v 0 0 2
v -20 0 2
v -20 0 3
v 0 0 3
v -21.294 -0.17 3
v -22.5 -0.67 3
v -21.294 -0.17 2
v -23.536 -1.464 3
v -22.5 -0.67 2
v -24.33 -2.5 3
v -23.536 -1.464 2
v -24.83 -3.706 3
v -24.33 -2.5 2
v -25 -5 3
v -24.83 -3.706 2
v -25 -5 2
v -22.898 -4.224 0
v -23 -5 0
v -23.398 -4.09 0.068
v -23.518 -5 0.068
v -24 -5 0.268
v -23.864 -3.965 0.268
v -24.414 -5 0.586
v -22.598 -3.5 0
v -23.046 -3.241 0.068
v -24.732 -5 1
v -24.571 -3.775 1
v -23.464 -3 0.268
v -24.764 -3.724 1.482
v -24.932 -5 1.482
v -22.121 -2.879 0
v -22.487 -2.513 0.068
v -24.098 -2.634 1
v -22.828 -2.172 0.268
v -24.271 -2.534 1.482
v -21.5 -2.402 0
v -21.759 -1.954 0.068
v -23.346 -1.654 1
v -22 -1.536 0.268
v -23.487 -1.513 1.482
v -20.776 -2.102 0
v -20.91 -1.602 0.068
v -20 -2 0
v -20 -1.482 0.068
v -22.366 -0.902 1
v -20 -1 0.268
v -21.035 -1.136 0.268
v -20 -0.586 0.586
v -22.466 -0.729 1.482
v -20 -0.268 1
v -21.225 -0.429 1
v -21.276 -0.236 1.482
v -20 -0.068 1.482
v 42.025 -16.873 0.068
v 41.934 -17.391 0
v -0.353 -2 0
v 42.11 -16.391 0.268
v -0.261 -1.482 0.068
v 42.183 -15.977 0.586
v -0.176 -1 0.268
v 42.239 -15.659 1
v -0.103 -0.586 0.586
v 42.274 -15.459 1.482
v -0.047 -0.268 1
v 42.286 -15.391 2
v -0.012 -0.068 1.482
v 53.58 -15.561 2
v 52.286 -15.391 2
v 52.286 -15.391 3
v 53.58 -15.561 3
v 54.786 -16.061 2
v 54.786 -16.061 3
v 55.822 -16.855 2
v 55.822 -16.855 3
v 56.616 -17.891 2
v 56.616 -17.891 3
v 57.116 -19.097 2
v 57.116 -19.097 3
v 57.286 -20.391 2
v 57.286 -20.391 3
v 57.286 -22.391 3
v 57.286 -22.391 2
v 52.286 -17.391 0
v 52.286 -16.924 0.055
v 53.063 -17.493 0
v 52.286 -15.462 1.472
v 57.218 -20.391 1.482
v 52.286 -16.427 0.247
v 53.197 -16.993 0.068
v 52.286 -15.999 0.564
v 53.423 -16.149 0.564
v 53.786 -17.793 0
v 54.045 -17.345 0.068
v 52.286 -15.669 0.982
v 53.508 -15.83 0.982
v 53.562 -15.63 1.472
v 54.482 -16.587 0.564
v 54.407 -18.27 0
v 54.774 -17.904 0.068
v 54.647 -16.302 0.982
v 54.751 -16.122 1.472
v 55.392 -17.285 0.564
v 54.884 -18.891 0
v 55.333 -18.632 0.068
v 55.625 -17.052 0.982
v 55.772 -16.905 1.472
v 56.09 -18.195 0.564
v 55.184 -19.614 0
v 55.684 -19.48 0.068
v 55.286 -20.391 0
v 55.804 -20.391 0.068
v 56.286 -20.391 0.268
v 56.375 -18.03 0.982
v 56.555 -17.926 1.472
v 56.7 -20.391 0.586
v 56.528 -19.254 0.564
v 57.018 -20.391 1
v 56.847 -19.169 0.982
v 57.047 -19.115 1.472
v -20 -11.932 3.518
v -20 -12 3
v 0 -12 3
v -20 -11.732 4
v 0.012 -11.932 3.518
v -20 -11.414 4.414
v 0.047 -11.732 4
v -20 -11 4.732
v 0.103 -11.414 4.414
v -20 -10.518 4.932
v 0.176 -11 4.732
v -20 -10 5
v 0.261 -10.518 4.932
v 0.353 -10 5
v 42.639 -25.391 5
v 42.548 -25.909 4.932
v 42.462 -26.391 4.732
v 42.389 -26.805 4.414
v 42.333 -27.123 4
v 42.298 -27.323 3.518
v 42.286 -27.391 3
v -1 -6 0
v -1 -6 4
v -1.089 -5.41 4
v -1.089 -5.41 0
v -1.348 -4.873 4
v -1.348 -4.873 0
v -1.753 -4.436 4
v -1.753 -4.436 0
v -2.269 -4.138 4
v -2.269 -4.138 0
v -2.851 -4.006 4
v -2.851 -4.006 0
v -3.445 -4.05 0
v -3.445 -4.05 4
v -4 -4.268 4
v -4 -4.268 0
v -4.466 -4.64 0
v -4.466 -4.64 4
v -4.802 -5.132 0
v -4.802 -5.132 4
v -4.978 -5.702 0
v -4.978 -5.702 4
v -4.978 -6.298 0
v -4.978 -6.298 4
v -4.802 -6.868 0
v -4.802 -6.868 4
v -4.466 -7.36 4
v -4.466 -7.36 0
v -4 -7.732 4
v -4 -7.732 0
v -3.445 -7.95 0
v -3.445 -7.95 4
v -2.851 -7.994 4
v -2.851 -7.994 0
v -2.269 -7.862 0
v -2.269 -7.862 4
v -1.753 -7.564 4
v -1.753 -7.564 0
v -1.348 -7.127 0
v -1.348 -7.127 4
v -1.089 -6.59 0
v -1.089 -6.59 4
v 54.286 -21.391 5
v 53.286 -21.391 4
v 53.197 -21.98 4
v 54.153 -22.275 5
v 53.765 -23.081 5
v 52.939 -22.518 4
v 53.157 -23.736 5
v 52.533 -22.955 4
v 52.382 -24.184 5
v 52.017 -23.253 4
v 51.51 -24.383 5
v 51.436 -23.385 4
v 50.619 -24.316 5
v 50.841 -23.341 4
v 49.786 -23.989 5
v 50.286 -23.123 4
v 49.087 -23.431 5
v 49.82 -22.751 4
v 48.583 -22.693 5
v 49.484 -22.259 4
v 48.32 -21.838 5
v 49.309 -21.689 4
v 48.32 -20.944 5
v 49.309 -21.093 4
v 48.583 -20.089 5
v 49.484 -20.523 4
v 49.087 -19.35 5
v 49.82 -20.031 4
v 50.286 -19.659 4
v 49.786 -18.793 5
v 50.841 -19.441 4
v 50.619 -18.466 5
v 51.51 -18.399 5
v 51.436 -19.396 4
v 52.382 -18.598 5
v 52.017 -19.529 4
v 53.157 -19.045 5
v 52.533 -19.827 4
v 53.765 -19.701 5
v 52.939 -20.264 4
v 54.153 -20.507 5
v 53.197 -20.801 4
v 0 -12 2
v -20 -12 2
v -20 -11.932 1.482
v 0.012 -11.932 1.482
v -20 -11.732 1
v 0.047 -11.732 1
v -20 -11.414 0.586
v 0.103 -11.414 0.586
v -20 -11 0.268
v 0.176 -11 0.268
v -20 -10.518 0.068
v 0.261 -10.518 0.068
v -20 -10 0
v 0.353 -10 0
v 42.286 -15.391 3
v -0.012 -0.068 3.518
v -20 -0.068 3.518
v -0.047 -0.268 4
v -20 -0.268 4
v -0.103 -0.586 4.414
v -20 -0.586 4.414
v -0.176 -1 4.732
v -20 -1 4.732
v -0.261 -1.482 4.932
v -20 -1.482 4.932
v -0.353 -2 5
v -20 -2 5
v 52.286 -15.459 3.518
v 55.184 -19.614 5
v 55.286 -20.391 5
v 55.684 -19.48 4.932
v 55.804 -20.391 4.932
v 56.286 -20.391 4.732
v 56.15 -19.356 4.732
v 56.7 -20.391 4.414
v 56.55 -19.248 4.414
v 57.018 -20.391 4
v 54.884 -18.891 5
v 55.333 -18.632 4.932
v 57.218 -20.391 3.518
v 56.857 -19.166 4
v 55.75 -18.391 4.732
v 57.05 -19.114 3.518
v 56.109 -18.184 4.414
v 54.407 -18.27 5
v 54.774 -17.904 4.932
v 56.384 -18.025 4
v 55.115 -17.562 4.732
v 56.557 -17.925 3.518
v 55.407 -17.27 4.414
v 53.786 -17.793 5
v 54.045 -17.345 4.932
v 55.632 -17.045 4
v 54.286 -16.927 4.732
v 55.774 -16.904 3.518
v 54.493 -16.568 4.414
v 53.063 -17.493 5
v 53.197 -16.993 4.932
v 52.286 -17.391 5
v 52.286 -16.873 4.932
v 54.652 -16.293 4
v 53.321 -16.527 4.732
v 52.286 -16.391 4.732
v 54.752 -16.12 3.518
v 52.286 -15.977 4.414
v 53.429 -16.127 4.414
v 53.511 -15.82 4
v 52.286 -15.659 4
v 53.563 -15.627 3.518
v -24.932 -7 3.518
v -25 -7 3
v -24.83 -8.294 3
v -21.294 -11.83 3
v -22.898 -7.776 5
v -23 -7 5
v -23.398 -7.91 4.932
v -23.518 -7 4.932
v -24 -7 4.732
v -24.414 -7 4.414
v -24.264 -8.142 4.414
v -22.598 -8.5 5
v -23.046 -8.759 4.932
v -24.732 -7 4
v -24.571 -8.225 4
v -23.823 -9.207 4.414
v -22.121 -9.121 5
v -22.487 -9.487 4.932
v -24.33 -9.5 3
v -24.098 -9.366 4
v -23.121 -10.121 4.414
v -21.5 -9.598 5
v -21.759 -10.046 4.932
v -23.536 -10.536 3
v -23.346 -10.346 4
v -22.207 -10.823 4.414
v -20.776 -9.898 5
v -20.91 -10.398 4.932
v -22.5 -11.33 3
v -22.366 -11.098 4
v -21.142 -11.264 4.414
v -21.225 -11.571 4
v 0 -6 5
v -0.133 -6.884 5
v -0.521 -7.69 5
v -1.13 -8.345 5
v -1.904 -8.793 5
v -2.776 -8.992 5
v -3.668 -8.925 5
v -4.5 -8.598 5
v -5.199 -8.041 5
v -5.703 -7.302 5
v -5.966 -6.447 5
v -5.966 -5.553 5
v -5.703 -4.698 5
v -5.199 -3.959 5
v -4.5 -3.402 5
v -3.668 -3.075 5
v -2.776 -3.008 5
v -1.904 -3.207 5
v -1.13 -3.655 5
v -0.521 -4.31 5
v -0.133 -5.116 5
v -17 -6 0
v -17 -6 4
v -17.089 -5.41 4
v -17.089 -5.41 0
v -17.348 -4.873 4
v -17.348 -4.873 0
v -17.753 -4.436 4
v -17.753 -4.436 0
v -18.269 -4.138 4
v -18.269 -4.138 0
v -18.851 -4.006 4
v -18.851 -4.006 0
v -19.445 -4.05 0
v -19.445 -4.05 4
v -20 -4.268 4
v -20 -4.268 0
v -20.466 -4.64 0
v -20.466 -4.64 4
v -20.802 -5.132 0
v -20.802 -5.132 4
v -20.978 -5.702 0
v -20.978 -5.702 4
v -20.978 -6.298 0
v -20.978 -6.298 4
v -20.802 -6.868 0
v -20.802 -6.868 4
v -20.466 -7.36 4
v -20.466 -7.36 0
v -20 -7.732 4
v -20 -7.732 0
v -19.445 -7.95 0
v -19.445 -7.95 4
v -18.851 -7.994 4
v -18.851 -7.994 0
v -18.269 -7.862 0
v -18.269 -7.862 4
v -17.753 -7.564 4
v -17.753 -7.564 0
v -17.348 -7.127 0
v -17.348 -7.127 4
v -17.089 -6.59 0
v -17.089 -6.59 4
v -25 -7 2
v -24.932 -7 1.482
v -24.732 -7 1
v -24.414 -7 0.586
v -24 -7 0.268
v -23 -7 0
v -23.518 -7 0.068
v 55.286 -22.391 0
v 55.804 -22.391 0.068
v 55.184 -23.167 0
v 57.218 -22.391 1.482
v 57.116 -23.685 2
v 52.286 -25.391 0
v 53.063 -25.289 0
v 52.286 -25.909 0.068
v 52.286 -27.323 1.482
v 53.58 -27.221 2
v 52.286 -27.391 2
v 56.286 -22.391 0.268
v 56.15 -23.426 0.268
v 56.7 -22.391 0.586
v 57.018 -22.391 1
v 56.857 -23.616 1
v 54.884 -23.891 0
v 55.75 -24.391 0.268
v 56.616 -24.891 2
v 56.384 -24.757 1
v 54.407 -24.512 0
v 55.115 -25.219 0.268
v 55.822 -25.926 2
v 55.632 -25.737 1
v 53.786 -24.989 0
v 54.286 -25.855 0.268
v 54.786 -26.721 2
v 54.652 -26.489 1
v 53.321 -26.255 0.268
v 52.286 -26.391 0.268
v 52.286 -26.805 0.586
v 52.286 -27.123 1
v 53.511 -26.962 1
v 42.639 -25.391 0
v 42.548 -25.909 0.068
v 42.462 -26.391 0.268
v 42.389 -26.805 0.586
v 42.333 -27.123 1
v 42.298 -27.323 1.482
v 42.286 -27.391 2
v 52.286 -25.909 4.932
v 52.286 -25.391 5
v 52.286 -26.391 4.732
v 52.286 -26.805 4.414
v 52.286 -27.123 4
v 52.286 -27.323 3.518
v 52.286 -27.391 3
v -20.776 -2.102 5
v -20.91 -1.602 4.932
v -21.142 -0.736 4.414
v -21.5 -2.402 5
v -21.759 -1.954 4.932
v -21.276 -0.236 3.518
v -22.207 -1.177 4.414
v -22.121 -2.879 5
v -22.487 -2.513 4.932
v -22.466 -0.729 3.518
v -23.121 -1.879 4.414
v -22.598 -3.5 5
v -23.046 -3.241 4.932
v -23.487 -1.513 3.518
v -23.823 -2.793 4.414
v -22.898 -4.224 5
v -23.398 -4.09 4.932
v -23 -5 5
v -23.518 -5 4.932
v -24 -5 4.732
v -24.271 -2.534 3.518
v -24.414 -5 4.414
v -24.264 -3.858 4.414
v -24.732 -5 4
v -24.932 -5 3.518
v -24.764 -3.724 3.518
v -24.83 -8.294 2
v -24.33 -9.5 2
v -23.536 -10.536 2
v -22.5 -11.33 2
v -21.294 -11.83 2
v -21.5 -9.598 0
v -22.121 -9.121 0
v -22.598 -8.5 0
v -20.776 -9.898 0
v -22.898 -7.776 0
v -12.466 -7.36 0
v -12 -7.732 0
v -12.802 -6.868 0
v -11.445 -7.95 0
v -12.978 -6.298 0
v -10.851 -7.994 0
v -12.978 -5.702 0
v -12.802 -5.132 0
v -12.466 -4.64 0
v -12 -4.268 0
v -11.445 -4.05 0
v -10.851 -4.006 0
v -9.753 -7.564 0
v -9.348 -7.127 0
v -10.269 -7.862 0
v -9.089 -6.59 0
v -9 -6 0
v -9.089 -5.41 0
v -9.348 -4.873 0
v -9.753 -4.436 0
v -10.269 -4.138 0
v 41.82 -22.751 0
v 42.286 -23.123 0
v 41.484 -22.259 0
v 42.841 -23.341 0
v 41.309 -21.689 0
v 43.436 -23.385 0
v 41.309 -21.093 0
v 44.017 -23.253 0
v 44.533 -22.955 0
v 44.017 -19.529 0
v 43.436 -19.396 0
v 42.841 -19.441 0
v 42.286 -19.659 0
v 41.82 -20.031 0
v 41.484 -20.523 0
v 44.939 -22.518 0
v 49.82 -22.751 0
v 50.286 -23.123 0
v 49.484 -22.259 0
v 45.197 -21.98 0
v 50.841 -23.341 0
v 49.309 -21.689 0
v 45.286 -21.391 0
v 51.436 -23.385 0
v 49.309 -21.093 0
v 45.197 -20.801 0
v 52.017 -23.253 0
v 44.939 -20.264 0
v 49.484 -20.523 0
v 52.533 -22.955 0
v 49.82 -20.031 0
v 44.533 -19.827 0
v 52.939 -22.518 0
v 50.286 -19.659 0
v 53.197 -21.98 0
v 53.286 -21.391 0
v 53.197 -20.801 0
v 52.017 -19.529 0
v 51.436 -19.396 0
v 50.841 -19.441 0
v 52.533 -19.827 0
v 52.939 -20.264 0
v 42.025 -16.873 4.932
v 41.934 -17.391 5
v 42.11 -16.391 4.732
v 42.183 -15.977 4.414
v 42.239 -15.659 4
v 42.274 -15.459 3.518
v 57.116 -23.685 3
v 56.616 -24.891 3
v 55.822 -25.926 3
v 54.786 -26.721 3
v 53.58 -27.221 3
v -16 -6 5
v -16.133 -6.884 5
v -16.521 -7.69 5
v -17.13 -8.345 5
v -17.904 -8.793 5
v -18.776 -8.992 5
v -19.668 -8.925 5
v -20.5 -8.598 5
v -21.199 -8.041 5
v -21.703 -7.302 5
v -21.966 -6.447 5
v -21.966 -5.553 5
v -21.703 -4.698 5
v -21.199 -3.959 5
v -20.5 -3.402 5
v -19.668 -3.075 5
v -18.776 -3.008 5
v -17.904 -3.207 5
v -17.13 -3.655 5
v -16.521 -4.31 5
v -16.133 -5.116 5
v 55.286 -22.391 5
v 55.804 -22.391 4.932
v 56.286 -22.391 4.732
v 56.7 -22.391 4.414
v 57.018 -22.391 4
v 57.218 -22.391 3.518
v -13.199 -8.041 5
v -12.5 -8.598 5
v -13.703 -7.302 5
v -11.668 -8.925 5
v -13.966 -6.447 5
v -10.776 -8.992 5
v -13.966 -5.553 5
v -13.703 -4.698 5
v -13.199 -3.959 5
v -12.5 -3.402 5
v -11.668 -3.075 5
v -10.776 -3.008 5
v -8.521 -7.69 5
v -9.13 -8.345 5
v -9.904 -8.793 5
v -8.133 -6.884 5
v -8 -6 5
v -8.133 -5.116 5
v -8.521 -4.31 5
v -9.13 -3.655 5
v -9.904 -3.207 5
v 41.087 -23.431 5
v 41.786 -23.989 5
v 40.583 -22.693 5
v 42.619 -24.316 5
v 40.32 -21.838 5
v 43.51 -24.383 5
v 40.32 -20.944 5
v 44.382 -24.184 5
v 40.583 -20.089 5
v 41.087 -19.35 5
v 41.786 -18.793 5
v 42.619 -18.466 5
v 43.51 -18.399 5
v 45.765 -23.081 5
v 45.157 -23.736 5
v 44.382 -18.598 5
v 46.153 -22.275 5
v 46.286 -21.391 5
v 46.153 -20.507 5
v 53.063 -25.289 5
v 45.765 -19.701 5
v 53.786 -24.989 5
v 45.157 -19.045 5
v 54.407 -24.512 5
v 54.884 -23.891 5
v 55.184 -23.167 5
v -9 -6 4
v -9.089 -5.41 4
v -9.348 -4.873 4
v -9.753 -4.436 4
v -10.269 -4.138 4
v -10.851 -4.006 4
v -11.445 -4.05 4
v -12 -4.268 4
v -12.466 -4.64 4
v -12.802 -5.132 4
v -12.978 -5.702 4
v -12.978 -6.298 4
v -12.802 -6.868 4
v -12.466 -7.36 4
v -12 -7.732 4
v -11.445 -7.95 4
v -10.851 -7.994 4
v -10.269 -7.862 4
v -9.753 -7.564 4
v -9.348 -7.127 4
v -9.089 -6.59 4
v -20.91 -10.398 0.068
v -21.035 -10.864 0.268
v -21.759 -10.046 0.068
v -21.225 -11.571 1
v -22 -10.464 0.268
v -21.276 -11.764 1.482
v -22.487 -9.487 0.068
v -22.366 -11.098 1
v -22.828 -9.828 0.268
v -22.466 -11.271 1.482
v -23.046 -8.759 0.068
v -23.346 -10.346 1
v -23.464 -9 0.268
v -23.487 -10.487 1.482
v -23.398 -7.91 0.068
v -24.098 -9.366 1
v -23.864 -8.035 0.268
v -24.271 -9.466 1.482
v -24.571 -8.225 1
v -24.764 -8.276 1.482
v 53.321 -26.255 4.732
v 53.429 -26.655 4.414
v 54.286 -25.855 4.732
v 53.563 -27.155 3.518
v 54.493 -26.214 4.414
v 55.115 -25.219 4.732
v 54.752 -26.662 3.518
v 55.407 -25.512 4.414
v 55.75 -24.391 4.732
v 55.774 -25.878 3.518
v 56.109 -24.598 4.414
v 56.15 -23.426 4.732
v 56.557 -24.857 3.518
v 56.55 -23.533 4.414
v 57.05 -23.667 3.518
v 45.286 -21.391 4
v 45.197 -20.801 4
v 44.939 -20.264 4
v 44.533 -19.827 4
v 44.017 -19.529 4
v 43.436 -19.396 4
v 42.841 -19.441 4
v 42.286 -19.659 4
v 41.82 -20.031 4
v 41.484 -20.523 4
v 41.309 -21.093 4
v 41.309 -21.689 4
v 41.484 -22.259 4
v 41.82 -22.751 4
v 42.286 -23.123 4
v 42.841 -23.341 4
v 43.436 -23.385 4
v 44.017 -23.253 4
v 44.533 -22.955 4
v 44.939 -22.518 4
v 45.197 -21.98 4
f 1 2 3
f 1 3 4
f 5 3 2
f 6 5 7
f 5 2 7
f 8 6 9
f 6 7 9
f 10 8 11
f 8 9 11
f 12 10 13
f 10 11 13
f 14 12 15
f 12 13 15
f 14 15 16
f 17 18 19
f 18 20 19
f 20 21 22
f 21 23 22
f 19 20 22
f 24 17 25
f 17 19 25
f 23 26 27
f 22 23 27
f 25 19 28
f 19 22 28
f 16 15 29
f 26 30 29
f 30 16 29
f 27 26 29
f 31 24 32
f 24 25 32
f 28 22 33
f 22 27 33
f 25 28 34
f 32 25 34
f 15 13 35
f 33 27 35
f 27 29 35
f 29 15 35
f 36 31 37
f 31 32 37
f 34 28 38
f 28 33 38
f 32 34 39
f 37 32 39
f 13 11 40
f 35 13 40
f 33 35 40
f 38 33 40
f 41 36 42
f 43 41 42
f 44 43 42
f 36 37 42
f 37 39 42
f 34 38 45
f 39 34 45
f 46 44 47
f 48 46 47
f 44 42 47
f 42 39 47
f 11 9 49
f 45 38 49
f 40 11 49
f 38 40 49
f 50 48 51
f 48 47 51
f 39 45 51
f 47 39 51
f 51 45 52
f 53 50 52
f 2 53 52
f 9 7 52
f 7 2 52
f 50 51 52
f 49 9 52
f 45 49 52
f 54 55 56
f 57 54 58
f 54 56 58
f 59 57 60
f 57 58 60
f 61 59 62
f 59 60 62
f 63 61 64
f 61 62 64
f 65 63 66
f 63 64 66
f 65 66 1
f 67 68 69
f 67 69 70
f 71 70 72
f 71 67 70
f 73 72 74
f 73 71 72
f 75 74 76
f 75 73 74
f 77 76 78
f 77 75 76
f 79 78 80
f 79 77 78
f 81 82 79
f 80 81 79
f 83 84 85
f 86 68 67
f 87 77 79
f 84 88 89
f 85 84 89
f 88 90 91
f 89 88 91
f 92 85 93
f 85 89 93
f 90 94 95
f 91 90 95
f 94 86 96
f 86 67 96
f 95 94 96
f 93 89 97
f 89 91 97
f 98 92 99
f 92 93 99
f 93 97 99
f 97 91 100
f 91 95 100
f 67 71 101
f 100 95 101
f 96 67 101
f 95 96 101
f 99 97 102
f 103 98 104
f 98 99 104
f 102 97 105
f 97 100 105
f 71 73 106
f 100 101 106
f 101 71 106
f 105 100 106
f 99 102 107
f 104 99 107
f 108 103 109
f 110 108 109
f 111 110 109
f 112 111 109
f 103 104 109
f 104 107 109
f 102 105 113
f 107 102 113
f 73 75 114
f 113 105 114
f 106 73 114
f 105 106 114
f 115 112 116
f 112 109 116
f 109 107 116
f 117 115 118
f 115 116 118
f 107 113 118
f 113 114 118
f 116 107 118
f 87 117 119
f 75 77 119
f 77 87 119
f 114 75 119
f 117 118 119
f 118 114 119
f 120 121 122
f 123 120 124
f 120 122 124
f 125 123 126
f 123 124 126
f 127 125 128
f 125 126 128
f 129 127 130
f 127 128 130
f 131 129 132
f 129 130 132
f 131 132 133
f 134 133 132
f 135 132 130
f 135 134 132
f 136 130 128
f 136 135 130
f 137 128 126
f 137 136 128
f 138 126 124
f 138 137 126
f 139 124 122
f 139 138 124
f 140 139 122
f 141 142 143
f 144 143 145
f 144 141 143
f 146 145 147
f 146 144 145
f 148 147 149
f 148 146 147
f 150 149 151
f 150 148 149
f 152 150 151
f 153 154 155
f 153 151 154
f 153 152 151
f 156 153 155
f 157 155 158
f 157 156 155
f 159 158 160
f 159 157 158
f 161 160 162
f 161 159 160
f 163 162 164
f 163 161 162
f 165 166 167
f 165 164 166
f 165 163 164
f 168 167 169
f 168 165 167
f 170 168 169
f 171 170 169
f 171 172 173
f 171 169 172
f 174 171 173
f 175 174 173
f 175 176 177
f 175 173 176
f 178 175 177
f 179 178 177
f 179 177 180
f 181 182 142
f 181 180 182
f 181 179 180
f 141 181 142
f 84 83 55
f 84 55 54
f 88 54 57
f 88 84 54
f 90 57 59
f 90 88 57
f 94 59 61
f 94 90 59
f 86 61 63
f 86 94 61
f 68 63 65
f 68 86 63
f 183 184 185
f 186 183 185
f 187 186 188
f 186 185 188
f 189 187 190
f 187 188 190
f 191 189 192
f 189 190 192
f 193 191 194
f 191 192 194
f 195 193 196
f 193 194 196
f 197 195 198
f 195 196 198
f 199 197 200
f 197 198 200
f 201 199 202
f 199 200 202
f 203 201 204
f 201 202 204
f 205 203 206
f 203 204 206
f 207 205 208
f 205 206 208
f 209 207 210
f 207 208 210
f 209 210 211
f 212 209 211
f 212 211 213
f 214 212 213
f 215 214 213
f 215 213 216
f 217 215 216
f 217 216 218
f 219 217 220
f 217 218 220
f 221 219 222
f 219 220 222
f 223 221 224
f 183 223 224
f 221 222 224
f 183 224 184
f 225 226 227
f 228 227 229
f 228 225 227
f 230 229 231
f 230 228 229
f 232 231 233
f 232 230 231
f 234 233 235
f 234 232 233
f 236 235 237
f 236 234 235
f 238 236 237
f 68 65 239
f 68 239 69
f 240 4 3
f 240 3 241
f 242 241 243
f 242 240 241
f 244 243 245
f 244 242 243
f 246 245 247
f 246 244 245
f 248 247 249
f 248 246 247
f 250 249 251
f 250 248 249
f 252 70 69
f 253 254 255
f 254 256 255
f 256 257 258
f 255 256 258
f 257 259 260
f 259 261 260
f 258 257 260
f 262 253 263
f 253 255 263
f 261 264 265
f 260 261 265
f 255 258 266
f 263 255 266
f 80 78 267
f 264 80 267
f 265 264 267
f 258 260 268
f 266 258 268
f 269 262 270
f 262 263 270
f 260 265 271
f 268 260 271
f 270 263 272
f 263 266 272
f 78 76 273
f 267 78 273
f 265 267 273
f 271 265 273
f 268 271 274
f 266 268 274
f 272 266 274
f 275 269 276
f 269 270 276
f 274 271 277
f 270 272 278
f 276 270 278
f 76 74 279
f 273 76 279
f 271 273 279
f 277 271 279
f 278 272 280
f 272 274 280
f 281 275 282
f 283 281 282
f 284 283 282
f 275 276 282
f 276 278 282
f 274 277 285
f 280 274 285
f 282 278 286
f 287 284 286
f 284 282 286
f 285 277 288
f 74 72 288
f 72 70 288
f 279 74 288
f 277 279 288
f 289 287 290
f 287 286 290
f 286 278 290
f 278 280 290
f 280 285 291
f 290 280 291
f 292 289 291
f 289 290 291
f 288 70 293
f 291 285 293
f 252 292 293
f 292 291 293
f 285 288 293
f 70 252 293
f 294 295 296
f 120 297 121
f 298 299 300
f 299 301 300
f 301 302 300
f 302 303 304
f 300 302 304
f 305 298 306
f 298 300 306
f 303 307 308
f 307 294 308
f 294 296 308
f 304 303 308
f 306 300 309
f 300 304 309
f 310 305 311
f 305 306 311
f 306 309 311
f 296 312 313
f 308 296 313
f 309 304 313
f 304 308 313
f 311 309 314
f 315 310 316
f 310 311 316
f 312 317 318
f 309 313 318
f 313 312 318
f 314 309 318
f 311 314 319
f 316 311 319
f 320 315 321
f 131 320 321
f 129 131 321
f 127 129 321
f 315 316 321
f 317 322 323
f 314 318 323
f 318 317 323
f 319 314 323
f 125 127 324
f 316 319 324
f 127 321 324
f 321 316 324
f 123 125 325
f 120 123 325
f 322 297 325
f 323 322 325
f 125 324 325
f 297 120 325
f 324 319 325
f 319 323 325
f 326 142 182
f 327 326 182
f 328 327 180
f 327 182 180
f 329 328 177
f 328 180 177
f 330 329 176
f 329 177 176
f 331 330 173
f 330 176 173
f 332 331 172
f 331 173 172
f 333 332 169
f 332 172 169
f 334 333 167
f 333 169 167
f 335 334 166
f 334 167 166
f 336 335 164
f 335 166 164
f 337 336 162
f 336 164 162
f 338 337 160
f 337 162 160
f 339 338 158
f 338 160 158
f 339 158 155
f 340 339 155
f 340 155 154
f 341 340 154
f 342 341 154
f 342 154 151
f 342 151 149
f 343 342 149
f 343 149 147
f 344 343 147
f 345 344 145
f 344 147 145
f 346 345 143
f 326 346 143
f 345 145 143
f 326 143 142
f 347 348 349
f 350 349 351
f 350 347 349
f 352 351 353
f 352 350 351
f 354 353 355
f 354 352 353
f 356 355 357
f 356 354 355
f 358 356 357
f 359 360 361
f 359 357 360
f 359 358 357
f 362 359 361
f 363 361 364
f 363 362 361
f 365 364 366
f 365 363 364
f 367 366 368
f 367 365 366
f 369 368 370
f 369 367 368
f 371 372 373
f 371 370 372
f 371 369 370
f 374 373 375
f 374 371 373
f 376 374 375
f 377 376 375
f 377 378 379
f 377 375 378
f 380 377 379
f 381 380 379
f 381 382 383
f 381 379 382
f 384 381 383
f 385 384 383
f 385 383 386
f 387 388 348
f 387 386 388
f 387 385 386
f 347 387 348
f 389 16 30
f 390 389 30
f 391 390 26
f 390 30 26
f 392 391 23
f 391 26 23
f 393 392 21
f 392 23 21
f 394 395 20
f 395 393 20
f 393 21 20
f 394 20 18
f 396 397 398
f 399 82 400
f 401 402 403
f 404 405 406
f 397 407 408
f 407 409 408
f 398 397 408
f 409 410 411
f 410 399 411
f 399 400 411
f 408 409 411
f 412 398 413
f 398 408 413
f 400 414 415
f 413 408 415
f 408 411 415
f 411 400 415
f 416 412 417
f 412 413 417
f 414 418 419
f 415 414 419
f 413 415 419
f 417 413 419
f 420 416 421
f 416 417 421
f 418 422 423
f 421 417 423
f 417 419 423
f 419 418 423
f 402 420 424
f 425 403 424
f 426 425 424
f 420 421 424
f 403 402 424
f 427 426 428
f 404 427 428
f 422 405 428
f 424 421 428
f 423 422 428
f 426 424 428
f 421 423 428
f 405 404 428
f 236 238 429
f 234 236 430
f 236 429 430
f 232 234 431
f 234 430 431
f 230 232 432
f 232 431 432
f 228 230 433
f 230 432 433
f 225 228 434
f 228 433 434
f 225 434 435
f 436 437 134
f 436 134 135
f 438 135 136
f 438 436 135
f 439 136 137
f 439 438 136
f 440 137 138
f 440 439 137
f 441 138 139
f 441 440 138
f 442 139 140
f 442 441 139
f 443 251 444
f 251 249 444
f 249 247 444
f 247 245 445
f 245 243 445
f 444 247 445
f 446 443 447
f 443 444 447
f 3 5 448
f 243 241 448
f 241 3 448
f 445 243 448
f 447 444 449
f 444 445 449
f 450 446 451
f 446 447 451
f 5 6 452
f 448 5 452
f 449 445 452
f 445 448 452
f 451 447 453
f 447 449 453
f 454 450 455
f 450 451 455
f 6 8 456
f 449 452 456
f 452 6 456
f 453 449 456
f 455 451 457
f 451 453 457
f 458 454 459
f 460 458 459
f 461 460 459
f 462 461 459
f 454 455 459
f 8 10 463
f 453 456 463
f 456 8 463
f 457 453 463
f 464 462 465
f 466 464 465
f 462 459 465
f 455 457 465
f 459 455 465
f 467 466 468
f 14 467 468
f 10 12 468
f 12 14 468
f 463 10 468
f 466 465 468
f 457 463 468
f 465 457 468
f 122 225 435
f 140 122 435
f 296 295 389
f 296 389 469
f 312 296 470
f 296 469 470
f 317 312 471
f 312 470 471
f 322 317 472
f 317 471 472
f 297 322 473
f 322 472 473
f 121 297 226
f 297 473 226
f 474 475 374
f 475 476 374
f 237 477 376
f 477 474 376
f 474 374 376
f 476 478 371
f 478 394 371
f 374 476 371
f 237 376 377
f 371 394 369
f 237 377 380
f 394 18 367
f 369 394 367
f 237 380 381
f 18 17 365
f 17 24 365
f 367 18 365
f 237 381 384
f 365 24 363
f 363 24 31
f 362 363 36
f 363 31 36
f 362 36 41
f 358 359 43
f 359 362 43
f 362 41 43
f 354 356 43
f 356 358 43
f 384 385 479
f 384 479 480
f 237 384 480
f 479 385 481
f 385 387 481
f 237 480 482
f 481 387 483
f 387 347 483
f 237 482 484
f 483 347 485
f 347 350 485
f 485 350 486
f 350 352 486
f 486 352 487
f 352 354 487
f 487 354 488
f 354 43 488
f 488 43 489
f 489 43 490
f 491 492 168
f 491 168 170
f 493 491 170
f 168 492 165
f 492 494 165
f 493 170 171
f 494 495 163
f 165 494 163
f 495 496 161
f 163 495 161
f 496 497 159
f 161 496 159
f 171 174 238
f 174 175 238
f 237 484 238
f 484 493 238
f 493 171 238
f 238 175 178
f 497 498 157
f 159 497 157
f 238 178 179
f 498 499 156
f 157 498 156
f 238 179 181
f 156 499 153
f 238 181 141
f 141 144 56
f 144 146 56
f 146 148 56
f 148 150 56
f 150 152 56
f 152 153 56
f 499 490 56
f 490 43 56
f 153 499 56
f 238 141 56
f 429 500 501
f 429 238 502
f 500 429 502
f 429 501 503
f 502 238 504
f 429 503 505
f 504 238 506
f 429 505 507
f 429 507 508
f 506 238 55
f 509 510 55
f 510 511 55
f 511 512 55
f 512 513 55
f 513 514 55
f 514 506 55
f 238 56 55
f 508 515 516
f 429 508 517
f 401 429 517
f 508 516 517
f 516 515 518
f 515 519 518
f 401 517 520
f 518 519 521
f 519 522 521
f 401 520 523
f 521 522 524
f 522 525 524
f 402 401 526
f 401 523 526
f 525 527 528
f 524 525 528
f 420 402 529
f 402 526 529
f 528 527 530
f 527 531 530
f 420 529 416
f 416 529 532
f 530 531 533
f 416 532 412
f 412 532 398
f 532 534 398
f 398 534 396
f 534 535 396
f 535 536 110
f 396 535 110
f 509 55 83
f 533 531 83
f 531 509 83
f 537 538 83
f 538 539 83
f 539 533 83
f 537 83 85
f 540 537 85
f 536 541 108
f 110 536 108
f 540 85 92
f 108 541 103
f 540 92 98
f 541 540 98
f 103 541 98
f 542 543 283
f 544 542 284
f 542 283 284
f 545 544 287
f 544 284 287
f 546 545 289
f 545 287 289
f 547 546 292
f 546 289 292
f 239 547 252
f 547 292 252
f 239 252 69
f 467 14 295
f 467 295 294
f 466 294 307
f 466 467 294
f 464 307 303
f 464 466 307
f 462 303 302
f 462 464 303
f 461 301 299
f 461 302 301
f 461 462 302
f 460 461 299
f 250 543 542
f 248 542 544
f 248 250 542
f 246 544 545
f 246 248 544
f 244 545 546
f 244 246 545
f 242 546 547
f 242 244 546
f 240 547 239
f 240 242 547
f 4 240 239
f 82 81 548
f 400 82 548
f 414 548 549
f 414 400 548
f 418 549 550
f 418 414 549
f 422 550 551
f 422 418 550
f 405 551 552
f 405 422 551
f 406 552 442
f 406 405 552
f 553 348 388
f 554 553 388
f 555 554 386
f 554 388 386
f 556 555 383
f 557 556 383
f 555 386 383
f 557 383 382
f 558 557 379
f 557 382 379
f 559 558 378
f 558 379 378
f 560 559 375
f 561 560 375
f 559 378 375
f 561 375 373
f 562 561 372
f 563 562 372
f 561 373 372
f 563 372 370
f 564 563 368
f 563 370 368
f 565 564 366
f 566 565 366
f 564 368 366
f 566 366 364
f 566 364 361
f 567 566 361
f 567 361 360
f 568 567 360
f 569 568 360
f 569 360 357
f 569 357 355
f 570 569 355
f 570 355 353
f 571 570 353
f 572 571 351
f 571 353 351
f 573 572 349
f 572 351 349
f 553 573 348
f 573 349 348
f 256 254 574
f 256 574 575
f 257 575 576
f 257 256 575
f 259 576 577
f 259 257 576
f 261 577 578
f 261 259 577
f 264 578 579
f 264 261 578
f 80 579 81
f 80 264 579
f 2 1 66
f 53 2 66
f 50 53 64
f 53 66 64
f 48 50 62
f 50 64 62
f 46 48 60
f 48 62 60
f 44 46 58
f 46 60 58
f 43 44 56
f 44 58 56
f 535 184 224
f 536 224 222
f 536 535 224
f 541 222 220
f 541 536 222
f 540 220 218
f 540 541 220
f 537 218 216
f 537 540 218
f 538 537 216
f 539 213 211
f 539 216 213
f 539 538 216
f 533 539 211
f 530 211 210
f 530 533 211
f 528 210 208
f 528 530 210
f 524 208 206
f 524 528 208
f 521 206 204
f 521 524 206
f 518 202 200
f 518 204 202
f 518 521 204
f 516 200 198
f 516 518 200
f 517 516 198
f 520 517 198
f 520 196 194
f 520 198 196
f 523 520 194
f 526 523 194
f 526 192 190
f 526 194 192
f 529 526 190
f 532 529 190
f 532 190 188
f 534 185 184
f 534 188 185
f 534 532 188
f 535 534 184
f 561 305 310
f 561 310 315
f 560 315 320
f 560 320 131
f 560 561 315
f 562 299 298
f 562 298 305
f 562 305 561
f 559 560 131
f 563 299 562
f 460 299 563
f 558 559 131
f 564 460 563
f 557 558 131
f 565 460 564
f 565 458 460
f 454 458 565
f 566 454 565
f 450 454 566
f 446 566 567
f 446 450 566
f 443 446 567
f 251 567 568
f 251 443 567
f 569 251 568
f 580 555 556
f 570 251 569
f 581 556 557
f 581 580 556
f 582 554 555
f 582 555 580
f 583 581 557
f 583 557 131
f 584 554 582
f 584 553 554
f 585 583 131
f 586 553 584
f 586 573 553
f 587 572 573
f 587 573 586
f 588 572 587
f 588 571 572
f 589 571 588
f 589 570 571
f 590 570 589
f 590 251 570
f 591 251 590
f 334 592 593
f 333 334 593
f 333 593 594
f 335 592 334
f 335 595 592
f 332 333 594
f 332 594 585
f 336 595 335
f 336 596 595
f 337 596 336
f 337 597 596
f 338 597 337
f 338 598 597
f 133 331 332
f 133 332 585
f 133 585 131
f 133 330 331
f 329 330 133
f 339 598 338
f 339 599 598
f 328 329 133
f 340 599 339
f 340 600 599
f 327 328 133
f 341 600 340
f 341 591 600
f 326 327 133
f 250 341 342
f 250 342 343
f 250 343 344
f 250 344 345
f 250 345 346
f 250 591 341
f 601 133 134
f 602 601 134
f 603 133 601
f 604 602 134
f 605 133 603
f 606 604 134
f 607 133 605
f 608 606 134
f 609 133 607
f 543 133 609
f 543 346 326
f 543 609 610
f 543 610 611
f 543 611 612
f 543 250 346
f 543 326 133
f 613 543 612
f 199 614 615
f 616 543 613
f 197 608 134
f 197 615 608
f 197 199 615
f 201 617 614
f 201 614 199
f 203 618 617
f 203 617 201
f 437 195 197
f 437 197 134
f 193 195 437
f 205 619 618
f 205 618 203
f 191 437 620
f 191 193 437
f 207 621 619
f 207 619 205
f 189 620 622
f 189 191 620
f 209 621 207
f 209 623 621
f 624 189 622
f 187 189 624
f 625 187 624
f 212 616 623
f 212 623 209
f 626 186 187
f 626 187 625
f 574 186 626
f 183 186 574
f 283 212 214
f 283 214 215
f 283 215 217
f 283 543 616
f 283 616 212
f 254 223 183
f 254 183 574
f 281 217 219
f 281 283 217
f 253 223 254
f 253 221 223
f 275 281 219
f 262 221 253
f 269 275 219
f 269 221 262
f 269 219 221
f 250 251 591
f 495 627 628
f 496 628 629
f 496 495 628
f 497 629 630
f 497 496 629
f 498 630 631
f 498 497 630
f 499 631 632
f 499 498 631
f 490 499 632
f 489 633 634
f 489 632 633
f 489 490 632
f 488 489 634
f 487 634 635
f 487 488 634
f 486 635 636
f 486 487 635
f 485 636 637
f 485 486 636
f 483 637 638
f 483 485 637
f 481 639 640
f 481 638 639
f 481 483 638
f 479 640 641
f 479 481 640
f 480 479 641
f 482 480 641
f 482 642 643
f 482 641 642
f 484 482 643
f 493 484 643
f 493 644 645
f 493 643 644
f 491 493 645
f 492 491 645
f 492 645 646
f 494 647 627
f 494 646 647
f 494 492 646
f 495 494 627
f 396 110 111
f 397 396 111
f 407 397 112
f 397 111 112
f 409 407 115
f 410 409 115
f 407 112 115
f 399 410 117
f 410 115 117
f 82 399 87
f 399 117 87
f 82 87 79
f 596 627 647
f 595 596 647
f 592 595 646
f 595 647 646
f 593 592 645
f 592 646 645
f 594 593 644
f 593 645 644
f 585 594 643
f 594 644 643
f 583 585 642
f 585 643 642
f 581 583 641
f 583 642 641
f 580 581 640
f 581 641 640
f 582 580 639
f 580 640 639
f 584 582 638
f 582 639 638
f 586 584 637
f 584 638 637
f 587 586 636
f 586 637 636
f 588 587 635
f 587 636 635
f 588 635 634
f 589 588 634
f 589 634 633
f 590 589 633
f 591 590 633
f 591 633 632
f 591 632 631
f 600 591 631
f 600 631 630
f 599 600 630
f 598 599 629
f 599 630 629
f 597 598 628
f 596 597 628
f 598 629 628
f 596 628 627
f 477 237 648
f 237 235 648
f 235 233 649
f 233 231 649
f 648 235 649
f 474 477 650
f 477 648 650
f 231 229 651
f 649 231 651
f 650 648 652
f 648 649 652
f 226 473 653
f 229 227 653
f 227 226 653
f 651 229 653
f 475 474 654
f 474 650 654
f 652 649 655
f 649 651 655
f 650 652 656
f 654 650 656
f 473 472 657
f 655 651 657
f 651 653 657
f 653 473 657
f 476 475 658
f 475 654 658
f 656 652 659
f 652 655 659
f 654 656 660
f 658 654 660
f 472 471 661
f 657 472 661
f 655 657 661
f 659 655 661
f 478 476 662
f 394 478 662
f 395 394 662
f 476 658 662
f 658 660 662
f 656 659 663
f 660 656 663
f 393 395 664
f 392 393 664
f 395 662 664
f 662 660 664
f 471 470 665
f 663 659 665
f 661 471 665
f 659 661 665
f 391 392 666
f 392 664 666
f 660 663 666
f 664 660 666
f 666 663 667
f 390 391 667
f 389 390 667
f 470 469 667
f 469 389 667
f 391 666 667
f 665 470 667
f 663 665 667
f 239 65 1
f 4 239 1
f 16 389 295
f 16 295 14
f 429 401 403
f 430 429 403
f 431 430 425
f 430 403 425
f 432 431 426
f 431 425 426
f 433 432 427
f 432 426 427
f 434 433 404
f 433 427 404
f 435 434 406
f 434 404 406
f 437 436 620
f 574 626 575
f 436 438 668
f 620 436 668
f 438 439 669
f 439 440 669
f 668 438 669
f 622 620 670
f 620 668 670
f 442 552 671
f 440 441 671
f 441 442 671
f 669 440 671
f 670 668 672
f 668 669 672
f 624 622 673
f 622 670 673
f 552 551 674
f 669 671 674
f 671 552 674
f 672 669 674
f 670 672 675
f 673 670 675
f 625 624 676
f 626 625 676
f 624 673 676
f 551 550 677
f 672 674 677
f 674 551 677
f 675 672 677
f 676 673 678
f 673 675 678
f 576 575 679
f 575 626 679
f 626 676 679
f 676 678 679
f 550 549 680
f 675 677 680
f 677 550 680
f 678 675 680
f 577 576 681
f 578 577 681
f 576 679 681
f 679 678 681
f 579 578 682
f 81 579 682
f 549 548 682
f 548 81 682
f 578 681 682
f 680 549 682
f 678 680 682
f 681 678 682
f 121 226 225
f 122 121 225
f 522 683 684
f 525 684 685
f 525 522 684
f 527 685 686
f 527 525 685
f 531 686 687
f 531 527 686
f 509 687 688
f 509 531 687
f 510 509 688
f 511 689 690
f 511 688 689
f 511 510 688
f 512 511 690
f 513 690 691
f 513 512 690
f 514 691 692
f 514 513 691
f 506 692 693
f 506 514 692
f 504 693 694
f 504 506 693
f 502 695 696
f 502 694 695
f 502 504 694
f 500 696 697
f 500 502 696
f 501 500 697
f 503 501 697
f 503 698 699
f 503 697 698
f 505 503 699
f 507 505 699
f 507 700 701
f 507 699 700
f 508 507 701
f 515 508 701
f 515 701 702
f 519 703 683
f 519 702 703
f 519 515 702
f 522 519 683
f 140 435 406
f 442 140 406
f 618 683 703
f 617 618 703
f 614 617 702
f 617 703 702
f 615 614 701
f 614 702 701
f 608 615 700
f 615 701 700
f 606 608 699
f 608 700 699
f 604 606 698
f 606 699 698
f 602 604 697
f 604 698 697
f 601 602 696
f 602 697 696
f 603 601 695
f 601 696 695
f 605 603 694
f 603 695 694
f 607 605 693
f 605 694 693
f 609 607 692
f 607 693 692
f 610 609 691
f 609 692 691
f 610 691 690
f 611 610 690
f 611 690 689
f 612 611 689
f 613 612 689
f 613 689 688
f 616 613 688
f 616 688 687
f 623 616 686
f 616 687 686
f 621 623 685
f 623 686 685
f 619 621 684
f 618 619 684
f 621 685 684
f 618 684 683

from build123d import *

# Parameters (mm, degrees)
F0_W         = 25
F0_H         = 12
F0_W_2       = 15
F1_DEPTH     = 5
F2_R         = 2
F3_DEPTH     = 5.001
F4_R         = 2
F5_T1_DEPTH  = 5
F5_T4_ANGLE  = 90
F5_T6_ANGLE  = 90
F5_T8_ANGLE  = 90
F5_T10_ANGLE = 90
F5_T12_ANGLE = 90
F5_T14_ANGLE = 90
F5_T16_ANGLE = 90
F5_T18_ANGLE = 90
F6_SIZE      = 1


# Not quite as in the source:
# - a fillet or chamfer that OpenCascade refuses, or shapes differently, is made with other operations: its cross-section is extruded or revolved along the edge and cut away or added


with BuildPart() as f1:
    # F0 (on Top) → F1 (new body)
    with BuildSketch(Plane.XY):
        with Locations((-12.5, -6)):
            Rectangle(F0_W, F0_H)
        Polygon((42.2861679354, -15.3909064497), (0, 0), (0, -12), (42.2861679354, -27.3909064497), align=None)
        with Locations((49.7861679354, -21.3909064497)):
            Rectangle(F0_W_2, F0_H)
    extrude(amount=F1_DEPTH)

    # F2 (on Top) → F3 (cut, through all)
    with BuildSketch(Plane.XY):
        with Locations((51.2861679354, -21.3909064497)):
            Circle(F2_R)
        with Locations((-19, -6)):
            Circle(F2_R)
        with Locations((43.2861679354, -21.3909064497)):
            Circle(F2_R)
        with Locations((-11, -6)):
            Circle(F2_R)
        with Locations((-3, -6)):
            Circle(F2_R)
    extrude(amount=F3_DEPTH, mode=Mode.SUBTRACT)

    # F4
    f4_edges = [f1.edges().sort_by_distance(p)[0] for p in [
        (21.143084, -19.695453, 5),
        (21.143084, -7.695453, 5),
        (-12.5, -12, 5),
        (-12.5, 0, 5),
        (49.786168, -27.390906, 5),
        (57.286168, -21.390906, 5),
        (49.786168, -15.390906, 5),
        (49.786168, -27.390906, 0),
        (21.143084, -19.695453, 0),
        (-12.5, -12, 0),
        (57.286168, -21.390906, 0),
        (21.143084, -7.695453, 0),
        (49.786168, -15.390906, 0),
        (-12.5, 0, 0),
        (-25, -6, 0),
        (-25, -6, 5),
    ]]
    fillet(f4_edges, radius=F4_R)

    # F5: fillet of radius 5 on 4 edges, made by hand

    # F5_s2 → F5_t1 (cut)
    with BuildSketch(Plane.XY):
        with BuildLine():
            ThreePointArc((52.2861679354, -15.3909064497), (55.8217018413, -16.8553725437), (57.2861679354, -20.3909064497))
            Line((57.2861679354, -20.3909064497), (57.2861679354, -15.3909064497))
            Line((57.2861679354, -15.3909064497), (52.2861679354, -15.3909064497))
        make_face()
        with BuildLine():
            ThreePointArc((-20, 0), (-23.5355339059, -1.4644660941), (-25, -5))
            Line((-25, -5), (-25, 0))
            Line((-25, 0), (-20, 0))
        make_face()
        with BuildLine():
            ThreePointArc((-25, -7), (-23.5355339059, -10.5355339059), (-20, -12))
            Line((-20, -12), (-25, -12))
            Line((-25, -12), (-25, -7))
        make_face()
        with BuildLine():
            ThreePointArc((57.2861679354, -22.3909064497), (55.8217018413, -25.9264403556), (52.2861679354, -27.3909064497))
            Line((52.2861679354, -27.3909064497), (57.2861679354, -27.3909064497))
            Line((57.2861679354, -27.3909064497), (57.2861679354, -22.3909064497))
        make_face()
    extrude(amount=F5_T1_DEPTH, mode=Mode.SUBTRACT)

    # F5_s3 → F5_t4 (revolve, cut)
    with BuildSketch(Plane.YZ.offset(52.2861679354)):
        with BuildLine():
            ThreePointArc((-25.3909064497, 5), (-26.805120012, 4.4142135624), (-27.3909064497, 3))
            Line((-27.3909064497, 3), (-27.3909064497, 5))
            Line((-27.3909064497, 5), (-25.3909064497, 5))
        make_face()
    revolve(axis=Axis((52.2861679354, -22.3909064497, 5), (0, 0, 1)), revolution_arc=F5_T4_ANGLE, mode=Mode.SUBTRACT)

    # F5_s5 → F5_t6 (revolve, cut)
    with BuildSketch(Plane.XZ.offset(7)):
        with BuildLine():
            ThreePointArc((-23, 5), (-24.4142135624, 4.4142135624), (-25, 3))
            Line((-25, 3), (-25, 5))
            Line((-25, 5), (-23, 5))
        make_face()
    revolve(axis=Axis((-20, -7, 5), (0, 0, 1)), revolution_arc=F5_T6_ANGLE, mode=Mode.SUBTRACT)

    # F5_s7 → F5_t8 (revolve, cut)
    with BuildSketch(Plane.YZ.offset(-20)):
        with BuildLine():
            ThreePointArc((-2, 5), (-0.5857864376, 4.4142135624), (0, 3))
            Line((0, 3), (0, 5))
            Line((0, 5), (-2, 5))
        make_face()
    revolve(axis=Axis((-20, -5, 5), (0, 0, 1)), revolution_arc=F5_T8_ANGLE, mode=Mode.SUBTRACT)

    # F5_s9 → F5_t10 (revolve, cut)
    with BuildSketch(Plane.XZ.offset(5)):
        with BuildLine():
            ThreePointArc((-23, 0), (-24.4142135624, 0.5857864376), (-25, 2))
            Line((-25, 2), (-25, 0))
            Line((-25, 0), (-23, 0))
        make_face()
    revolve(axis=Axis((-20, -5, 0), (0, 0, -1)), revolution_arc=F5_T10_ANGLE, mode=Mode.SUBTRACT)

    # F5_s11 → F5_t12 (revolve, cut)
    with BuildSketch(Plane.YZ.offset(-20)):
        with BuildLine():
            ThreePointArc((-10, 0), (-11.4142135624, 0.5857864376), (-12, 2))
            Line((-12, 2), (-12, 0))
            Line((-12, 0), (-10, 0))
        make_face()
    revolve(axis=Axis((-20, -7, 0), (0, 0, -1)), revolution_arc=F5_T12_ANGLE, mode=Mode.SUBTRACT)

    # F5_s13 → F5_t14 (revolve, cut)
    with BuildSketch(Plane.XZ.offset(22.3909064497)):
        with BuildLine():
            ThreePointArc((55.2861679354, 0), (56.7003814977, 0.5857864376), (57.2861679354, 2))
            Line((57.2861679354, 2), (57.2861679354, 0))
            Line((57.2861679354, 0), (55.2861679354, 0))
        make_face()
    revolve(axis=Axis((52.2861679354, -22.3909064497, 0), (0, 0, -1)), revolution_arc=F5_T14_ANGLE, mode=Mode.SUBTRACT)

    # F5_s15 → F5_t16 (revolve, cut)
    with BuildSketch(Plane.YZ.offset(52.2861679354)):
        with BuildLine():
            ThreePointArc((-17.3909064497, 0), (-15.9766928873, 0.5857864376), (-15.3909064497, 2))
            Line((-15.3909064497, 2), (-15.3909064497, 0))
            Line((-15.3909064497, 0), (-17.3909064497, 0))
        make_face()
    revolve(axis=Axis((52.2861679354, -20.3909064497, 0), (0, 0, -1)), revolution_arc=F5_T16_ANGLE, mode=Mode.SUBTRACT)

    # F5_s17 → F5_t18 (revolve, cut)
    with BuildSketch(Plane.XZ.offset(20.3909064497)):
        with BuildLine():
            ThreePointArc((55.2861679354, 5), (56.7003814977, 4.4142135624), (57.2861679354, 3))
            Line((57.2861679354, 3), (57.2861679354, 5))
            Line((57.2861679354, 5), (55.2861679354, 5))
        make_face()
    revolve(axis=Axis((52.2861679354, -20.3909064497, 5), (0, 0, 1)), revolution_arc=F5_T18_ANGLE, mode=Mode.SUBTRACT)

    # F6
    f6_edges = [f1.edges().sort_by_distance(p)[0] for p in [
        (-21, -6, 5),
        (-13, -6, 5),
        (-5, -6, 5),
        (41.286168, -21.390906, 5),
        (49.286168, -21.390906, 5),
    ]]
    chamfer(f6_edges, length=F6_SIZE)


solid = f1.part
